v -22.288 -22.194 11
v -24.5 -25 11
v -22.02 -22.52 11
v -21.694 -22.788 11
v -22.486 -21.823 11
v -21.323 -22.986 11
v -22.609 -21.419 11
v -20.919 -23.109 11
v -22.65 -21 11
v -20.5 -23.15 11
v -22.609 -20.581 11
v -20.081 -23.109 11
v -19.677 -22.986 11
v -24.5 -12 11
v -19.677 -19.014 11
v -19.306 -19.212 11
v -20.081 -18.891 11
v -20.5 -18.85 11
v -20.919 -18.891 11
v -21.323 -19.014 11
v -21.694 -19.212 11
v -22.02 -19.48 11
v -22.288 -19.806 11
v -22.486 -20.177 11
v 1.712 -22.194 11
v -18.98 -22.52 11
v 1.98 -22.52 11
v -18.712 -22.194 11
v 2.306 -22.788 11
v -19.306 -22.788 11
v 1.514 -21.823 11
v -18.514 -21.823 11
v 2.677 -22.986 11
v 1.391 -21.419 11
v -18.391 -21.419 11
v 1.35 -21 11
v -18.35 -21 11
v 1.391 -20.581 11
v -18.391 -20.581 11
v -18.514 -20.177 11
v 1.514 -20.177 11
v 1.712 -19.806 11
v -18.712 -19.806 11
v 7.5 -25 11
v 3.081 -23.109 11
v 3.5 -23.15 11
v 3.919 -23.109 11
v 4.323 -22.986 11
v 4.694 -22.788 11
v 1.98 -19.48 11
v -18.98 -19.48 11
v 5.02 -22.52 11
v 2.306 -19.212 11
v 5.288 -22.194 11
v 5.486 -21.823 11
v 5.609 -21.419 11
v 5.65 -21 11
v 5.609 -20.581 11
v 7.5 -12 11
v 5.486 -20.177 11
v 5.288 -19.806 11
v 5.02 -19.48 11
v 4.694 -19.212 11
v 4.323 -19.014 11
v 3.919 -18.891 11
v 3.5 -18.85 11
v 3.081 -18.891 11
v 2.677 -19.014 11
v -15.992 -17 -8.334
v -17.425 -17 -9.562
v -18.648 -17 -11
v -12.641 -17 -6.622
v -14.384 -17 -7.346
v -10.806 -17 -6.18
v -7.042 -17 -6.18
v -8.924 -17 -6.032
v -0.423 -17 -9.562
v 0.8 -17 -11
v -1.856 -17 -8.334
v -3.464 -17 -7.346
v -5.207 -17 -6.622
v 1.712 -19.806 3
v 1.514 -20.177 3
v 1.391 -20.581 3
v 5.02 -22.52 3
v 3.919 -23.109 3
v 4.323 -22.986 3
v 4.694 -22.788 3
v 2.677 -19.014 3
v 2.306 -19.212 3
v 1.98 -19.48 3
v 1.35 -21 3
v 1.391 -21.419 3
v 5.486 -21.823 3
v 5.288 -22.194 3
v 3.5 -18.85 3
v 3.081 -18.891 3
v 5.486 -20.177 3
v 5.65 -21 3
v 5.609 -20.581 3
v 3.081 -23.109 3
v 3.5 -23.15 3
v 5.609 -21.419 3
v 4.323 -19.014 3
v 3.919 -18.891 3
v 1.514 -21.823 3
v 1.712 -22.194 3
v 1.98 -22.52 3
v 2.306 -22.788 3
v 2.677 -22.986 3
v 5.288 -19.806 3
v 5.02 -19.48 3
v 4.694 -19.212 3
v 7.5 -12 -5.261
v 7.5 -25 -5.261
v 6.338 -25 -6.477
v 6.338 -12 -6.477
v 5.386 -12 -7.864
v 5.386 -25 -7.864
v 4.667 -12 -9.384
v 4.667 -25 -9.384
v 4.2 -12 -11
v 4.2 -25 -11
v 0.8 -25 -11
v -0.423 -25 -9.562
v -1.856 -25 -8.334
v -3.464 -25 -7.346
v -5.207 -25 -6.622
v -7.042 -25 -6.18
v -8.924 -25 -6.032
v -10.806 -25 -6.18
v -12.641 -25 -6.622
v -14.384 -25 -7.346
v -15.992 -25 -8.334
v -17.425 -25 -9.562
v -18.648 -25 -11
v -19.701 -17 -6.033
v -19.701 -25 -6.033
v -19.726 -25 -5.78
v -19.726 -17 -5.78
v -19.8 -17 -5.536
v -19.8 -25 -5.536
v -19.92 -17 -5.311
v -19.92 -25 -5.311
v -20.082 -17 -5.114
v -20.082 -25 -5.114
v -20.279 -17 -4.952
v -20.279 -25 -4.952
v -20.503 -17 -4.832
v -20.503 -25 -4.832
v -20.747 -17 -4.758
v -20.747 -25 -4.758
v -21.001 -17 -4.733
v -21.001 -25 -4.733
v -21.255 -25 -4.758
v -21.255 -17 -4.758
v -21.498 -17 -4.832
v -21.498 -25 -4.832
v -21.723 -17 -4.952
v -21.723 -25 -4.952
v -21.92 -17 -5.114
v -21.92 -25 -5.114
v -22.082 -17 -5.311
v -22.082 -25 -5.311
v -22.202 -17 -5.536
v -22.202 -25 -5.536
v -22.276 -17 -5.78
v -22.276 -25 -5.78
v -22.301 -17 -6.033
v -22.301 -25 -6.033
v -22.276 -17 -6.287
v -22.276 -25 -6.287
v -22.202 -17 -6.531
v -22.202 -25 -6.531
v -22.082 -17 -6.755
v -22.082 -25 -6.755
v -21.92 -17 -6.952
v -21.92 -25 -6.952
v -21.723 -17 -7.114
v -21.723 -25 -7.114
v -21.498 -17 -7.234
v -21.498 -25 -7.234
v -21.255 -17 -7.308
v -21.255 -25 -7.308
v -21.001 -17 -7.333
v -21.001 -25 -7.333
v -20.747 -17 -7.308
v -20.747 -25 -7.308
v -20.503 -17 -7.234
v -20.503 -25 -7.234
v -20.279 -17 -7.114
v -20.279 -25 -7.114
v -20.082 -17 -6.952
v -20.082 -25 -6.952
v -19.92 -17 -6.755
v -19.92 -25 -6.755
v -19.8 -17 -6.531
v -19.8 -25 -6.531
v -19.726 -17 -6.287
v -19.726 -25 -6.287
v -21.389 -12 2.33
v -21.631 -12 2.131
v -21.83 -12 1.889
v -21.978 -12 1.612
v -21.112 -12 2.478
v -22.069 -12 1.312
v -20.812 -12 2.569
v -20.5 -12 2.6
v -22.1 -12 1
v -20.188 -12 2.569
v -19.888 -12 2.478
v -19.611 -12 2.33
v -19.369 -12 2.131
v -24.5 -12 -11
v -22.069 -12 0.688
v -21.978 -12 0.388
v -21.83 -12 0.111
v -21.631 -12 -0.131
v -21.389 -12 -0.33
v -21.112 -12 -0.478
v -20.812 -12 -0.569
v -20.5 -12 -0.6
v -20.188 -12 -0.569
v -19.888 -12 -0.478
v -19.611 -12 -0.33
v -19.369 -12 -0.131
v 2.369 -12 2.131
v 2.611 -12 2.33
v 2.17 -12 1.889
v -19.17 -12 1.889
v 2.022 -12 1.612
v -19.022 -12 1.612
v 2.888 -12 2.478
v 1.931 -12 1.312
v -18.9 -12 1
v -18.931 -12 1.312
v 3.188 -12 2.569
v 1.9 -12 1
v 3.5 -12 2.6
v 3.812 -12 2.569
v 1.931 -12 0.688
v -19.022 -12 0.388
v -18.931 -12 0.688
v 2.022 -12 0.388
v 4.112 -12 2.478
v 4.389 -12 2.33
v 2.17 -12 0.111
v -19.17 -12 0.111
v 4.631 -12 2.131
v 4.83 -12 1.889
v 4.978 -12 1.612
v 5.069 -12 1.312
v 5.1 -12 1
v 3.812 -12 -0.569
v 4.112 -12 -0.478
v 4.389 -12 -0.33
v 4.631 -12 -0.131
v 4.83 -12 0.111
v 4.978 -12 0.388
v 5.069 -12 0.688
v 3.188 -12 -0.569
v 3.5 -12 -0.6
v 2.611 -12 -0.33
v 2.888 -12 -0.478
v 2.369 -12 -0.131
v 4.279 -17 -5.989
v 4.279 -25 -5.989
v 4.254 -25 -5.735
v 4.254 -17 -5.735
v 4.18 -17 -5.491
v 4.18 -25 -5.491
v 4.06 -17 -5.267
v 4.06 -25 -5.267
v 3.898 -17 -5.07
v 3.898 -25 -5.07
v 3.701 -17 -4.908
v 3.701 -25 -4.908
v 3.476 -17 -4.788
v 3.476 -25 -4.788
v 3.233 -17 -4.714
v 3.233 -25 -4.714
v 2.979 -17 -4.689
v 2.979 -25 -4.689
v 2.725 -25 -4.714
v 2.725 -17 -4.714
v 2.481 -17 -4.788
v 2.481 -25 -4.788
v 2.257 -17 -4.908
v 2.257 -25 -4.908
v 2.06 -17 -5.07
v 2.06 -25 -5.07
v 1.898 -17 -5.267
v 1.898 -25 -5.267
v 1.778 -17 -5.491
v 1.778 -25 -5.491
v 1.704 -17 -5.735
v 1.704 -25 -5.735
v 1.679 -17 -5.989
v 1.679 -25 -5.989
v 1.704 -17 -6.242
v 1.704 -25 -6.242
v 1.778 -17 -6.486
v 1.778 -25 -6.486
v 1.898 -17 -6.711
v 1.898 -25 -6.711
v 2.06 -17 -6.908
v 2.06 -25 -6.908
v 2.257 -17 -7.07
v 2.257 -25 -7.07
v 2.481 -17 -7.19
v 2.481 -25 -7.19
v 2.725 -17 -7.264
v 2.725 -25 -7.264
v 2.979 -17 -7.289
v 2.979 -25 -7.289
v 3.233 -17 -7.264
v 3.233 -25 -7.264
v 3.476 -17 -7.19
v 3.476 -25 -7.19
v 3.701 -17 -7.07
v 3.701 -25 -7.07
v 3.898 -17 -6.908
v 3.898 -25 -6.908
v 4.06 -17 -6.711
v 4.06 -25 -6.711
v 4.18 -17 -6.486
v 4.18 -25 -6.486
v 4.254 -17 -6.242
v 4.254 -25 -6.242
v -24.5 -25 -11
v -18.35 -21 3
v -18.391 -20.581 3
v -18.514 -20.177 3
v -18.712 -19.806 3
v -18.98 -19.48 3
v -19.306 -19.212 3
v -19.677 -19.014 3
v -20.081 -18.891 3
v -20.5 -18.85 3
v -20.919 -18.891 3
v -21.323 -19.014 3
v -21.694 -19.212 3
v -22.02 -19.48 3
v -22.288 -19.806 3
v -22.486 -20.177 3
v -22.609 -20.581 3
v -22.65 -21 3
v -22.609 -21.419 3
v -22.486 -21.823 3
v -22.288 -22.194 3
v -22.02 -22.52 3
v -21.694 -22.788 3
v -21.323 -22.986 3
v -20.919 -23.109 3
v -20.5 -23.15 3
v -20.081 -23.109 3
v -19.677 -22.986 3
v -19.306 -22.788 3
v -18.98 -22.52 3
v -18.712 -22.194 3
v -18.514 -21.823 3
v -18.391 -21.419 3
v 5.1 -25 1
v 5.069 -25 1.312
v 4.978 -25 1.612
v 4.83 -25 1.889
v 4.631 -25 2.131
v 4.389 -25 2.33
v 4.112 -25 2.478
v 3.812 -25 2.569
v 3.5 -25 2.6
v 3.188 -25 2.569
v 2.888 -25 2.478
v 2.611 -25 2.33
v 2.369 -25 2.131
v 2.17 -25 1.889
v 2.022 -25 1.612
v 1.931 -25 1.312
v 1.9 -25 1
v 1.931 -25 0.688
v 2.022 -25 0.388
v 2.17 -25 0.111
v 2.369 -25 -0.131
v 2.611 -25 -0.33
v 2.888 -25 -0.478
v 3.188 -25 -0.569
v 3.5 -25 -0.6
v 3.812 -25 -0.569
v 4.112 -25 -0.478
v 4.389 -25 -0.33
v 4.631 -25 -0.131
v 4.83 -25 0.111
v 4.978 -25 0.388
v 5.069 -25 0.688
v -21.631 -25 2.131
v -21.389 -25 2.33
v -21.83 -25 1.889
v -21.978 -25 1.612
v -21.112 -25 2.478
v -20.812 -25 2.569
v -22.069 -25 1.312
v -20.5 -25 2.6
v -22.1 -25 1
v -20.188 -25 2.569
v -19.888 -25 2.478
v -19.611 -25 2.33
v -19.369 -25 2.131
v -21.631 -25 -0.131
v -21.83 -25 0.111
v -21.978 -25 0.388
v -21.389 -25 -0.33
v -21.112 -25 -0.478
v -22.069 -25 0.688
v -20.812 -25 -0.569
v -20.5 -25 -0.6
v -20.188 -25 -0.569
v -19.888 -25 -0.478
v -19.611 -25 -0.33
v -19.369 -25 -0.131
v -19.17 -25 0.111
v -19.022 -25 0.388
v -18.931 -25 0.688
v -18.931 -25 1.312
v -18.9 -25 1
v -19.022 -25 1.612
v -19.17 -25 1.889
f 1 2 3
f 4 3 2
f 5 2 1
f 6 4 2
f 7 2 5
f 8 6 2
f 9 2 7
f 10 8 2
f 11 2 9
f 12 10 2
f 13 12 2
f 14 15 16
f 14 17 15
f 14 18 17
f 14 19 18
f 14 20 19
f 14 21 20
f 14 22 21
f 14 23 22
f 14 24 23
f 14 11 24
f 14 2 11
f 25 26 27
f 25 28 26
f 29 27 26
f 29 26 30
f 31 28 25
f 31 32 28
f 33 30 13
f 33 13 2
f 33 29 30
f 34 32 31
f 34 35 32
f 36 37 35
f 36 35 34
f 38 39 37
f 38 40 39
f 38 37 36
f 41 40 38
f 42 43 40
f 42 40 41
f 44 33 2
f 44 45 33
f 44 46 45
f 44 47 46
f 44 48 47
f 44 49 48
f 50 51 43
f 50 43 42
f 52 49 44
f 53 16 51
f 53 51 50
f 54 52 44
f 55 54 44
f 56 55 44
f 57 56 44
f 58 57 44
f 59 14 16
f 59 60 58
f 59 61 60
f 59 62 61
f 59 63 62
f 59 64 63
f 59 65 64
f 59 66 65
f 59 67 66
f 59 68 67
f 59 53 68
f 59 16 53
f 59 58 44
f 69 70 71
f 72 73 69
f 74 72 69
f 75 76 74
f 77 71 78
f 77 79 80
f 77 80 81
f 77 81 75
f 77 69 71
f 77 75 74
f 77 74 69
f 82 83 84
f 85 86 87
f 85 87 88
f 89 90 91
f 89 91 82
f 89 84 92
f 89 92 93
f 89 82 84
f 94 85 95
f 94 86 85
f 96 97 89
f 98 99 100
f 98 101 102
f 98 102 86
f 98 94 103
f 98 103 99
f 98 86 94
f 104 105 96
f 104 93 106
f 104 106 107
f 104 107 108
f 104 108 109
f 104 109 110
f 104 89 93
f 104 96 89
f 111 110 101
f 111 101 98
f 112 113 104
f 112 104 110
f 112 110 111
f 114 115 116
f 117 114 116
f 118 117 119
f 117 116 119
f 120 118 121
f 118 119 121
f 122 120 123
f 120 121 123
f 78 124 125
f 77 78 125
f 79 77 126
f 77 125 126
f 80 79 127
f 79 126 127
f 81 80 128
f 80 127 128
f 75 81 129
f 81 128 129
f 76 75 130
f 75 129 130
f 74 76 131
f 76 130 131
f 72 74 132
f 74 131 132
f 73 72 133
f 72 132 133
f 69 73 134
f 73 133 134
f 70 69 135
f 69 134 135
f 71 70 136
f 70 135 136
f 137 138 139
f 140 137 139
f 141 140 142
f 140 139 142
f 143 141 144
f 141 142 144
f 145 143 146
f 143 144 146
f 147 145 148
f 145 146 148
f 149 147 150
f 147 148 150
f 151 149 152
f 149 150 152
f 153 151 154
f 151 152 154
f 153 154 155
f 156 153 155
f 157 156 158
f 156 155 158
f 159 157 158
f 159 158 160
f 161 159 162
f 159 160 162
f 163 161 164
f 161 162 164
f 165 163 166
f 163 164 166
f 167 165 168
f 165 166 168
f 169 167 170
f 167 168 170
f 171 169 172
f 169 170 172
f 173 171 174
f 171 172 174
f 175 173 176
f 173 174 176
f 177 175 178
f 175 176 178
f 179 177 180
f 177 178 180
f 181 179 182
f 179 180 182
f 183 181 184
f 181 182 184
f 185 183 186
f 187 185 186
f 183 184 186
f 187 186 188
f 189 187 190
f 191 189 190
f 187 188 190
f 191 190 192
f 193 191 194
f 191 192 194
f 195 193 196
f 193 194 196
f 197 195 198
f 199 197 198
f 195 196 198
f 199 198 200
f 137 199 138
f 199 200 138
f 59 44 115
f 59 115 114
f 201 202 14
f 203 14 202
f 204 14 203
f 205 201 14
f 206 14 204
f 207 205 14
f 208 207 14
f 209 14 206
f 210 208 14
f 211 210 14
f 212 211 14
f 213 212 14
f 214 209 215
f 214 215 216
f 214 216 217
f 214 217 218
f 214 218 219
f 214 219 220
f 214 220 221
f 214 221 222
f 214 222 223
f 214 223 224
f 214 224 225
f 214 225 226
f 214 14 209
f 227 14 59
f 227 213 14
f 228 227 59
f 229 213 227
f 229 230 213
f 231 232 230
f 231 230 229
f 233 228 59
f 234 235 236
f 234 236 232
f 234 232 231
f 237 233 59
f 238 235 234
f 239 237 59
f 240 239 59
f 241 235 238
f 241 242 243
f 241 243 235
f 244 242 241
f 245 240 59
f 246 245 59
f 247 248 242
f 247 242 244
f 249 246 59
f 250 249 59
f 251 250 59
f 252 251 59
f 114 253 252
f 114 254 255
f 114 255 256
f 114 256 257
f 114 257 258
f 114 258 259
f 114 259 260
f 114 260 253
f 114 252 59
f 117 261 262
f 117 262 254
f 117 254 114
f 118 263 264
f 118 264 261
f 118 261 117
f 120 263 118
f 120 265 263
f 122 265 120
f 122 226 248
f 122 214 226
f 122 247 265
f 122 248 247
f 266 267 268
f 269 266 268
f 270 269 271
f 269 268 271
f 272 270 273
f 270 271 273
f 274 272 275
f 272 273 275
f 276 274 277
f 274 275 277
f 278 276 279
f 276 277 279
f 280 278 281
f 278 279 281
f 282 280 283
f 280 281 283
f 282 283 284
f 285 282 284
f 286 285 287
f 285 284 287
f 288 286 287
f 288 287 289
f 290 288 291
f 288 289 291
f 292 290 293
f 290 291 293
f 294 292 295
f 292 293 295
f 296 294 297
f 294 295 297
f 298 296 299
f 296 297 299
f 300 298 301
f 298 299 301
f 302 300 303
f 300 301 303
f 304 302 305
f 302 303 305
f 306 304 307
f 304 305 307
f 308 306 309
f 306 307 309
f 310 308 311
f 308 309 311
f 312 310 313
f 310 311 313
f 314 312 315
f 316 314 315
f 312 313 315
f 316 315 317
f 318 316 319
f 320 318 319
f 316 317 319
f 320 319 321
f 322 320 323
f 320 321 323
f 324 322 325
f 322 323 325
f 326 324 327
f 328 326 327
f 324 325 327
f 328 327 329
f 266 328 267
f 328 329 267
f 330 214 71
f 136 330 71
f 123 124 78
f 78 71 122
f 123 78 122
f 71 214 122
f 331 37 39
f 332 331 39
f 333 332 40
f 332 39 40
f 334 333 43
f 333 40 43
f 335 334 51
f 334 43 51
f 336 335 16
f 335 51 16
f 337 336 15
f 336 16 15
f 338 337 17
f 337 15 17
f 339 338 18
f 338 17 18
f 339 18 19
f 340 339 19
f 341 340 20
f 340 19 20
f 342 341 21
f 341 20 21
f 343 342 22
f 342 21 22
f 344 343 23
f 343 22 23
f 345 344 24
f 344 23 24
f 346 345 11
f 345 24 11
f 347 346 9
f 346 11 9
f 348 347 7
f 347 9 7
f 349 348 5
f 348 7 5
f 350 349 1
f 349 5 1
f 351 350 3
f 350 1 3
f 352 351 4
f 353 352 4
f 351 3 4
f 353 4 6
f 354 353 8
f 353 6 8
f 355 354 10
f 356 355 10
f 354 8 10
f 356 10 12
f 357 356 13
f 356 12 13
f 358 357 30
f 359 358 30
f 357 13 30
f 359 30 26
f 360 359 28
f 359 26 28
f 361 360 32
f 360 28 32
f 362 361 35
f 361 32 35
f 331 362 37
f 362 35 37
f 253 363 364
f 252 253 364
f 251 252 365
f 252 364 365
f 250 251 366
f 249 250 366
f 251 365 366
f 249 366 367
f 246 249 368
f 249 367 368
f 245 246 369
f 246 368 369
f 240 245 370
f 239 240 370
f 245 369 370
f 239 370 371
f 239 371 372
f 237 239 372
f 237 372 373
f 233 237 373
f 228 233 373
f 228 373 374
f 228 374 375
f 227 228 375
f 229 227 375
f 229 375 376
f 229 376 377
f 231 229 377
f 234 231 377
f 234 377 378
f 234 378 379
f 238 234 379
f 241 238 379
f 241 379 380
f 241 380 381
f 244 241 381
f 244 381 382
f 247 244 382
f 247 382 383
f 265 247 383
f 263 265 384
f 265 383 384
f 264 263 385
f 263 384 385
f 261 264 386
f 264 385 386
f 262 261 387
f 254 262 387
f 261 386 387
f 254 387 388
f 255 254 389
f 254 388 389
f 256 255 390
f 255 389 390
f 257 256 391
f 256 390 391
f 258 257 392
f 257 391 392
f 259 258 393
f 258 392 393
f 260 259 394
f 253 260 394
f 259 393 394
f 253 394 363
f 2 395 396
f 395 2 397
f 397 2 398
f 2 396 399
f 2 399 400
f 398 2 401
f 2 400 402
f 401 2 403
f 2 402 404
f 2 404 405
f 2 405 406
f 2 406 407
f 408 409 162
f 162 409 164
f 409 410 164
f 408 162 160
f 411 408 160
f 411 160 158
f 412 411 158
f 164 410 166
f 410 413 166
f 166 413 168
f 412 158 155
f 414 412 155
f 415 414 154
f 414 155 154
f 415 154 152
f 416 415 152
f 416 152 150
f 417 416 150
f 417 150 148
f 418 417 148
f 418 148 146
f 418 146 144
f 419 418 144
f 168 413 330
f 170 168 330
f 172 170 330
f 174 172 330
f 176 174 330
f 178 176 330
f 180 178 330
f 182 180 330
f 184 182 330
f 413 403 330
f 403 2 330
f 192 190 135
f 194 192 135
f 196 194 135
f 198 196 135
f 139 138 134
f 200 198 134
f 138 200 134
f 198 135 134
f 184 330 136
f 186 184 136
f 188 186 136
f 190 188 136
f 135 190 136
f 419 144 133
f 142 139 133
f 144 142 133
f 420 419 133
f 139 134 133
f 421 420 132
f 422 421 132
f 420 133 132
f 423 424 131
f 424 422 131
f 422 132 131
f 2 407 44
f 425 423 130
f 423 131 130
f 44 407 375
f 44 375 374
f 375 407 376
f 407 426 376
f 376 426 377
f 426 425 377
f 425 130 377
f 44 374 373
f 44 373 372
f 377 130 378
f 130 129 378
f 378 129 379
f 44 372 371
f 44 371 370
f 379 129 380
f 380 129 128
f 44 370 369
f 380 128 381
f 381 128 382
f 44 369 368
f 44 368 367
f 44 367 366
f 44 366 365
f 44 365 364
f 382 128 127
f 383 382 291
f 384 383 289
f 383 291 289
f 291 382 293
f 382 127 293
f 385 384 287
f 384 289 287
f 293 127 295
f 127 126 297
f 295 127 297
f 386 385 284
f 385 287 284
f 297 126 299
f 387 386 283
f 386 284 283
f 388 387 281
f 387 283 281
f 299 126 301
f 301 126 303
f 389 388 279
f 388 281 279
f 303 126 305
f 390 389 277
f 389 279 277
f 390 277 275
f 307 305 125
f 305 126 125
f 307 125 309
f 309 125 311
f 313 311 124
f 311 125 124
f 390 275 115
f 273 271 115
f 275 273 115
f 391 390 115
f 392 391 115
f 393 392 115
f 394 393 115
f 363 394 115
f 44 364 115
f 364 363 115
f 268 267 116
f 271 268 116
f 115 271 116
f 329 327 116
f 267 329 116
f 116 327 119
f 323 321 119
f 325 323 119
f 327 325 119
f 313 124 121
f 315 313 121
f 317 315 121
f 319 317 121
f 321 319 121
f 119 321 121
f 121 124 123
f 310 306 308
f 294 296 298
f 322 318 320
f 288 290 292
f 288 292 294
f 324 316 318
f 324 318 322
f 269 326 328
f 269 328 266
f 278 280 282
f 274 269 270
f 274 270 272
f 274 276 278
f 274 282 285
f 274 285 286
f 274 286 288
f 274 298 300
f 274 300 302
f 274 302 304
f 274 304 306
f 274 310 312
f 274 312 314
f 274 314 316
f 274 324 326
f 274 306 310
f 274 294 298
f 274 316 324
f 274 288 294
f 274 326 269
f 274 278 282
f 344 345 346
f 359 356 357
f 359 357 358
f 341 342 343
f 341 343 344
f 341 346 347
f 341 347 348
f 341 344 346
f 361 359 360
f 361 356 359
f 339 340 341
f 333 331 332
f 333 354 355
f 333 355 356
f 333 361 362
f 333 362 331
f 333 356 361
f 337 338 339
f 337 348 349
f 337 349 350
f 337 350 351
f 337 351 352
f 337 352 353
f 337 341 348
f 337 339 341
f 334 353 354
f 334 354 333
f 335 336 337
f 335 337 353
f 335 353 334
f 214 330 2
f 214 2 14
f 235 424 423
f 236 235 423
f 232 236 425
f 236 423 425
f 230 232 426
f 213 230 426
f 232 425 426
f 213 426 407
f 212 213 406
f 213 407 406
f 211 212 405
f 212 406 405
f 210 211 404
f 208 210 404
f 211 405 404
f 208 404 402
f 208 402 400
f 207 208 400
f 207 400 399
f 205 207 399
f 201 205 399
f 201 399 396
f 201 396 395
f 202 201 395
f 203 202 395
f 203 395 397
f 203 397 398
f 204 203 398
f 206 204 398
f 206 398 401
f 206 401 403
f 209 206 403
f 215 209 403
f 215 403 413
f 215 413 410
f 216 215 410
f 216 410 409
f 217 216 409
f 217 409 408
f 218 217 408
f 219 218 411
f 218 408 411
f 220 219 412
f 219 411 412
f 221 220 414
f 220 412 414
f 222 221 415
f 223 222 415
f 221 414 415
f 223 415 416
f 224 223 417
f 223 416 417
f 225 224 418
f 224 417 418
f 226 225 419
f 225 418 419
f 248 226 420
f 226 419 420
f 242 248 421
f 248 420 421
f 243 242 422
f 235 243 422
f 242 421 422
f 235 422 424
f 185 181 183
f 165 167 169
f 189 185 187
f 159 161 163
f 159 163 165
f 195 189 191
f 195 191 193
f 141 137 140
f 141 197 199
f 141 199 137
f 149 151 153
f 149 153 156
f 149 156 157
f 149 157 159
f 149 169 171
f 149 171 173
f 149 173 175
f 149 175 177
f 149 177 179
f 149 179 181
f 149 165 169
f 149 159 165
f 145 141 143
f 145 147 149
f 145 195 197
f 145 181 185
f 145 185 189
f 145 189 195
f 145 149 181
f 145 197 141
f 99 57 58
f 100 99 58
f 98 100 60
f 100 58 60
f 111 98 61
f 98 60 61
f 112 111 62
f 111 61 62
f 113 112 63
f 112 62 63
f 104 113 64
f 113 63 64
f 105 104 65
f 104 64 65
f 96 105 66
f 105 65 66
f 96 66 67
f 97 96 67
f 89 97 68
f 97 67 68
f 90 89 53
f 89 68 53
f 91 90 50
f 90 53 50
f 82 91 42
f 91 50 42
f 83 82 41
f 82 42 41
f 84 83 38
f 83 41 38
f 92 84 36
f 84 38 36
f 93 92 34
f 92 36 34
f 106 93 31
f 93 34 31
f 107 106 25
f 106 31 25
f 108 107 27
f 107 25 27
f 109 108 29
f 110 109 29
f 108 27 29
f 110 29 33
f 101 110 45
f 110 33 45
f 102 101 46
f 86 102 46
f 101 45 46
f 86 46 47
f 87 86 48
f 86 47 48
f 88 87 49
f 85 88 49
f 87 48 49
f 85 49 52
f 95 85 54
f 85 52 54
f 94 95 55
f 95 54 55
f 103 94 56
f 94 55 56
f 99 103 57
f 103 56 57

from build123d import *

# Parameters (mm, degrees)
BOX009_W           = 32
BOX009_H           = 13
BOX009_DEPTH       = 22
SKETCH066_R        = 12
SKETCH066_R_2      = 1.3
POCKET042006_DEPTH = 8
SKETCH067_R        = 2.15
POCKET042007_DEPTH = 8
SKETCH068_R        = 1.6
POCKET042008_DEPTH = 13.001
SKETCH069_R        = 10.5
POCKET042009_DEPTH = 13.001


with BuildPart() as part:
    # Box009 → Box009 (new body)
    with BuildSketch(Plane(origin=(-24.5, -25, -11), x_dir=(1, 0, 0), z_dir=(0, 0, 1))):
        with Locations((16, 6.5)):
            Rectangle(BOX009_W, BOX009_H)
    extrude(amount=BOX009_DEPTH)

    # Sketch066 (on Face3 of Box009) → Pocket042006 (cut)
    with BuildSketch(Plane(origin=(-24.5, -25, -11), x_dir=(1, 0, 0), z_dir=(0, -1, 0))):
        with Locations((15.576077, -7.031956)):
            Circle(SKETCH066_R)
        with Locations((3.49904, 4.966864)):
            Circle(SKETCH066_R_2)
        with Locations((27.478965, 5.011155)):
            Circle(SKETCH066_R_2)
    extrude(amount=-POCKET042006_DEPTH, mode=Mode.SUBTRACT)

    # Sketch067 (on Face3 of Pocket042006) → Pocket042007 (cut)
    with BuildSketch(Plane(origin=(-24.5, -25, 11), x_dir=(1, 0, 0), z_dir=(0, 0, 1))):
        with Locations((4, 4)):
            Circle(SKETCH067_R)
        with Locations((28, 4)):
            Circle(SKETCH067_R)
    extrude(amount=-POCKET042007_DEPTH, mode=Mode.SUBTRACT)

    # Sketch068 (on Face2 of Pocket042007) → Pocket042008 (cut, through all)
    with BuildSketch(Plane(origin=(-24.5, -25, -11), x_dir=(1, 0, 0), z_dir=(0, -1, 0))):
        with Locations((4, 12)):
            Circle(SKETCH068_R)
        with Locations((28, 12)):
            Circle(SKETCH068_R)
    extrude(amount=-POCKET042008_DEPTH, mode=Mode.SUBTRACT)

    # Sketch069 (on Face2 of Pocket042008) → Pocket042009 (cut, through all)
    with BuildSketch(Plane(origin=(-24.5, -25, -11), x_dir=(1, 0, 0), z_dir=(0, -1, 0))):
        with Locations((38.988731, -2.097178)):
            Circle(SKETCH069_R)
    extrude(amount=-POCKET042009_DEPTH, mode=Mode.SUBTRACT)


solid = part.part
